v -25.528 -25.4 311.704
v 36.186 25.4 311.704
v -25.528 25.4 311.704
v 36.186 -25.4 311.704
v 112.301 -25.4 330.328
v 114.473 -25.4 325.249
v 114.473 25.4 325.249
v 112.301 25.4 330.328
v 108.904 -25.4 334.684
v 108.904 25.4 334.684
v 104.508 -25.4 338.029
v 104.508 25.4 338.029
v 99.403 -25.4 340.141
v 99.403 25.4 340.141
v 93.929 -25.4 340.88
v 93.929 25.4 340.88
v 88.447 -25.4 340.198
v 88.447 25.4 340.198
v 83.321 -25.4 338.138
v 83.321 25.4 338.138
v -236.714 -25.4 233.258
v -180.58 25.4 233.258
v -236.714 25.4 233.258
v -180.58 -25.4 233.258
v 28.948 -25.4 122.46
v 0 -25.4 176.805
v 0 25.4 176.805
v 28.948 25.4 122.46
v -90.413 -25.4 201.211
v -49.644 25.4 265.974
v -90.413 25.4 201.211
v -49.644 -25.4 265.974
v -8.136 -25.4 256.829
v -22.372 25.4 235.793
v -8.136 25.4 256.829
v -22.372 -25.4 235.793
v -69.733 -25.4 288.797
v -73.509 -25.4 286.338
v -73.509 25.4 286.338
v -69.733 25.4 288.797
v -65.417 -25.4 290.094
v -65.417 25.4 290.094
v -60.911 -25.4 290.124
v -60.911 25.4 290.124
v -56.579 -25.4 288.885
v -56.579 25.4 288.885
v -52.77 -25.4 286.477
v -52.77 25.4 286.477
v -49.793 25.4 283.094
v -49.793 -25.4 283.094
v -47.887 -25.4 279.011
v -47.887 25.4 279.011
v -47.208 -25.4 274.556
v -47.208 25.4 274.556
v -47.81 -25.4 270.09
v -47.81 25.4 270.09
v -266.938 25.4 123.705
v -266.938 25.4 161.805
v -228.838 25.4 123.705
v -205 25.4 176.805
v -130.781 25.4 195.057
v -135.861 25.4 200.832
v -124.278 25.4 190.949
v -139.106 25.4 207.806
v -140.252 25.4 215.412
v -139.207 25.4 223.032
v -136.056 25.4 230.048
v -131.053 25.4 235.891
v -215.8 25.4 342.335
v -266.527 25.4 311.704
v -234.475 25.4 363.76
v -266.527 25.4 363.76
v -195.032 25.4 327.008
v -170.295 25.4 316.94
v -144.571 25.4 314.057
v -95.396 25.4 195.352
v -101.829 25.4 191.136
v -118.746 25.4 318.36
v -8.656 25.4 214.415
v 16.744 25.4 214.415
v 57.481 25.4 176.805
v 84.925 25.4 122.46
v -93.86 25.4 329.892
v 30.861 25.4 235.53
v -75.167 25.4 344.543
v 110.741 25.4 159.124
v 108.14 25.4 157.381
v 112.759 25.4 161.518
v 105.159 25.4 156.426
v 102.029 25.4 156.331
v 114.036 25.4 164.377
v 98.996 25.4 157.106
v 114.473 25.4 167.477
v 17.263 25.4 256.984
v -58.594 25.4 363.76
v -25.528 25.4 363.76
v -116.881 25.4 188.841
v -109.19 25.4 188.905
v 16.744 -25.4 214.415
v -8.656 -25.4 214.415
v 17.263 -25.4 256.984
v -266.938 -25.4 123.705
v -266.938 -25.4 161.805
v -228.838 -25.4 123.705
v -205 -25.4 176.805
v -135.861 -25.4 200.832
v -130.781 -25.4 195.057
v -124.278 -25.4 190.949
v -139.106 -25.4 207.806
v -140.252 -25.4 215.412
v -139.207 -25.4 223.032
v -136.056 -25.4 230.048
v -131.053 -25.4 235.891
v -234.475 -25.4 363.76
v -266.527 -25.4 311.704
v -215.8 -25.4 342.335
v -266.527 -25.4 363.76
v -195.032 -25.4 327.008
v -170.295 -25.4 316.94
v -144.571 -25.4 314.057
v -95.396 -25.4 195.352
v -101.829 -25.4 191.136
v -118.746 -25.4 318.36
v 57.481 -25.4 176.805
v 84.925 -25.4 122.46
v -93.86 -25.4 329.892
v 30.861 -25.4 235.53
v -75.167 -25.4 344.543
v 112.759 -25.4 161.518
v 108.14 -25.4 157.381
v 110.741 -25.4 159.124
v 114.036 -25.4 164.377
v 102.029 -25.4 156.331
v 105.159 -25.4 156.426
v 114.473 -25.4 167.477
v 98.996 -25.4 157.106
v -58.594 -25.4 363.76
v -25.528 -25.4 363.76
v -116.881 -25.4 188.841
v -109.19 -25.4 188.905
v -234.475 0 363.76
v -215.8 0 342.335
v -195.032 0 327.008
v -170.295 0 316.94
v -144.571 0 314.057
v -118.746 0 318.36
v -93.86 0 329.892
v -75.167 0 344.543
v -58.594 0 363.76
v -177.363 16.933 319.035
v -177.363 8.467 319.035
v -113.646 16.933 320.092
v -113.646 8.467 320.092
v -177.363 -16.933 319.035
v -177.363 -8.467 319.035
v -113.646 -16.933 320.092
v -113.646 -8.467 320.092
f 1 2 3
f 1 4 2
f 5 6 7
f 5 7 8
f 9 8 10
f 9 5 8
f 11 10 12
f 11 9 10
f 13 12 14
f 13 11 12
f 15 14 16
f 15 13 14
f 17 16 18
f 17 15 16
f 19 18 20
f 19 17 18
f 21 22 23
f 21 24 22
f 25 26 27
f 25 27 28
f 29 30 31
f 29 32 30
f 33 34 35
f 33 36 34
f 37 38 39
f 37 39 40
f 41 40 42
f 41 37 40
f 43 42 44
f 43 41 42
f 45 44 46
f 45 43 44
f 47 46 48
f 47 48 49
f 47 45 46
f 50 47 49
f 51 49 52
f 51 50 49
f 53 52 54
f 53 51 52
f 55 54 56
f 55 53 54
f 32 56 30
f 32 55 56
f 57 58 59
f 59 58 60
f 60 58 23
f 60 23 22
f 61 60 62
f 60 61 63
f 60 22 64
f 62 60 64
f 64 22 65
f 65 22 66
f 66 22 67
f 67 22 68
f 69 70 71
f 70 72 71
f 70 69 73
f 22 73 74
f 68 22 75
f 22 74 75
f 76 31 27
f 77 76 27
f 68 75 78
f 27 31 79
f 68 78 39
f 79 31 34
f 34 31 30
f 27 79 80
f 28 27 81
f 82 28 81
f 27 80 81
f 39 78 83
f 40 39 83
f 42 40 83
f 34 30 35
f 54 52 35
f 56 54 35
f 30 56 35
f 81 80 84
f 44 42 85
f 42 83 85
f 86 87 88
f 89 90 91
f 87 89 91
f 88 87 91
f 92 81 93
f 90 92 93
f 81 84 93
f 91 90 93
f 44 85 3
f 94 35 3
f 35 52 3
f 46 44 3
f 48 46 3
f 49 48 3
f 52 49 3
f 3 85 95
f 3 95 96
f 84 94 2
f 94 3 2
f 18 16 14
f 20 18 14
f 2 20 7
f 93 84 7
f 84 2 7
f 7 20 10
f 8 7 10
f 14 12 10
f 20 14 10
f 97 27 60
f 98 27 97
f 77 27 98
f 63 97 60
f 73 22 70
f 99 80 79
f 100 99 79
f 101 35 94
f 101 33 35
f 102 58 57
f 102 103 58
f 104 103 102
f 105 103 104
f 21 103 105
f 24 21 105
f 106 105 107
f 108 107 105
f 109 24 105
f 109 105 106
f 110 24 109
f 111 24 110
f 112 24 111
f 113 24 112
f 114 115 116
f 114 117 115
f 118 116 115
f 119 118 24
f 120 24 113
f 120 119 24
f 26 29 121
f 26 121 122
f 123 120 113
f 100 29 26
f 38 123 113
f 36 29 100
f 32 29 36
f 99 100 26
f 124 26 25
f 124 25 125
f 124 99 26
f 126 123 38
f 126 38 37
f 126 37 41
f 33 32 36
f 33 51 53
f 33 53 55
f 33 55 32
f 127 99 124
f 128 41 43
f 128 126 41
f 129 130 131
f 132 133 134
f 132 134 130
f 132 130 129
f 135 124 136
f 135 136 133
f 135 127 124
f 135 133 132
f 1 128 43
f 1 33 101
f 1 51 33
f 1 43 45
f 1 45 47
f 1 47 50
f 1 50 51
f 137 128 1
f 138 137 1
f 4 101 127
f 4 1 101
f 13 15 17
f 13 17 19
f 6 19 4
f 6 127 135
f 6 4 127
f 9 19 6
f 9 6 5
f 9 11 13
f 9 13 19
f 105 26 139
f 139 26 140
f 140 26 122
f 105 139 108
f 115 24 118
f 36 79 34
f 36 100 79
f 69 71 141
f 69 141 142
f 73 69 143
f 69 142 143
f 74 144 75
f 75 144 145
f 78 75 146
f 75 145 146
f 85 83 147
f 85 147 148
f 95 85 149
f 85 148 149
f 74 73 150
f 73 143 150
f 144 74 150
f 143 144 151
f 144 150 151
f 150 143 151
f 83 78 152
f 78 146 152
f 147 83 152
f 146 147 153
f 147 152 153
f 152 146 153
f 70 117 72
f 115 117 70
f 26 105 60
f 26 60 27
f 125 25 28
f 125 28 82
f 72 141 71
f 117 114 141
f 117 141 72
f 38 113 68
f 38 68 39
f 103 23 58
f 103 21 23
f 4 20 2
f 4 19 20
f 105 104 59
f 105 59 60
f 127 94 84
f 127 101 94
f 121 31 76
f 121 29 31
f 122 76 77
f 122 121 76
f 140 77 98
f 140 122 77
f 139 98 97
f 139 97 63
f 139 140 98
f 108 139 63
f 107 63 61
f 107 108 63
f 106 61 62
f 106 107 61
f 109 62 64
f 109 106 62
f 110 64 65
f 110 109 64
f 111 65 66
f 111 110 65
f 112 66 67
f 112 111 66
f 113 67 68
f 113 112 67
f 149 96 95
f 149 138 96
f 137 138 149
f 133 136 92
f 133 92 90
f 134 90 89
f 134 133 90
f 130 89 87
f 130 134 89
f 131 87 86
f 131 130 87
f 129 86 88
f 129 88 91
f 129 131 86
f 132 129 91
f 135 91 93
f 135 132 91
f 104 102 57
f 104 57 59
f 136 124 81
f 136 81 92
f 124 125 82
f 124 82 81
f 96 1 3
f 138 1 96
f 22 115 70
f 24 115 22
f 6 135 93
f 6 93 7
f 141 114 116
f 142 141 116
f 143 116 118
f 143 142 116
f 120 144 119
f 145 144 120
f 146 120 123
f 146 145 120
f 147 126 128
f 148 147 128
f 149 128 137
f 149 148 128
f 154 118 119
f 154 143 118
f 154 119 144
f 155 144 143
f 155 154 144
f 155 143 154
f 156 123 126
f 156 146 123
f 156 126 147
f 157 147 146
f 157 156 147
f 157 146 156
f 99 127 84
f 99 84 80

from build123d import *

# Parameters (mm, degrees)
F1_DEPTH = 25.4


with BuildPart() as f1:
    # F0 (on Front) → F1 (new body, symmetric)
    with BuildSketch(Plane.XZ):
        with BuildLine():
            Line((-266.938031, 161.805029), (-266.938031, 123.705029))
            Line((-266.938031, 123.705029), (-228.838031, 123.705029))
            Line((-228.838031, 123.705029), (-204.99998, 176.804662))
            Line((-204.99998, 176.804662), (0, 176.804662))
            Line((0, 176.804662), (28.947621, 122.459758))
            Line((28.947621, 122.459758), (84.925383, 122.459758))
            Line((84.925383, 122.459758), (57.480857, 176.804662))
            Line((57.480857, 176.804662), (98.995887, 157.105953))
            ThreePointArc((98.995887, 157.105953), (109.502053, 158.161564), (114.473462, 167.477085))
            Line((114.473462, 167.477085), (114.473462, 325.248539))
            ThreePointArc((114.473462, 325.248539), (102.023839, 339.250338), (83.320737, 338.137943))
            Line((83.320737, 338.137943), (36.185727, 311.703503))
            Line((36.185727, 311.703503), (-25.528118, 311.703503))
            Line((-25.528118, 311.703503), (-25.528118, 363.759758))
            Line((-25.528118, 363.759758), (-58.593817, 363.759758))
            add(Edge.make_bspline(
                [(-234.475195, 363.759758), (-185.756028, 295.08689), (-104.223274, 299.842954), (-58.593817, 363.759758)],
                knots=[0, 0, 0, 0, 175.881378, 175.881378, 175.881378, 175.881378], degree=3))
            Line((-234.475195, 363.759758), (-266.526538, 363.759758))
            Line((-266.526538, 363.759758), (-266.526538, 311.703503))
            Line((-266.526538, 311.703503), (-180.580374, 233.25789))
            Line((-180.580374, 233.25789), (-236.713991, 233.25789))
            Line((-236.713991, 233.25789), (-266.938031, 161.805029))
        make_face()
        with BuildLine():
            Line((-131.053451, 235.890723), (-73.508778, 286.338449))
            ThreePointArc((-73.508778, 286.338449), (-52.76981, 286.47692), (-49.644388, 265.974343))
            Line((-49.644388, 265.974343), (-90.412526, 201.210762))
            ThreePointArc((-90.412526, 201.210762), (-130.780809, 195.057003), (-131.053451, 235.890723))
        make_face(mode=Mode.SUBTRACT)
        Polygon((30.861216, 235.530361), (16.744013, 214.414855), (-8.655987, 214.414855), (-22.372372, 235.7929), (-8.13638, 256.828502), (17.263144, 256.983855), align=None, mode=Mode.SUBTRACT)
    extrude(amount=F1_DEPTH, both=True)


solid = f1.part
